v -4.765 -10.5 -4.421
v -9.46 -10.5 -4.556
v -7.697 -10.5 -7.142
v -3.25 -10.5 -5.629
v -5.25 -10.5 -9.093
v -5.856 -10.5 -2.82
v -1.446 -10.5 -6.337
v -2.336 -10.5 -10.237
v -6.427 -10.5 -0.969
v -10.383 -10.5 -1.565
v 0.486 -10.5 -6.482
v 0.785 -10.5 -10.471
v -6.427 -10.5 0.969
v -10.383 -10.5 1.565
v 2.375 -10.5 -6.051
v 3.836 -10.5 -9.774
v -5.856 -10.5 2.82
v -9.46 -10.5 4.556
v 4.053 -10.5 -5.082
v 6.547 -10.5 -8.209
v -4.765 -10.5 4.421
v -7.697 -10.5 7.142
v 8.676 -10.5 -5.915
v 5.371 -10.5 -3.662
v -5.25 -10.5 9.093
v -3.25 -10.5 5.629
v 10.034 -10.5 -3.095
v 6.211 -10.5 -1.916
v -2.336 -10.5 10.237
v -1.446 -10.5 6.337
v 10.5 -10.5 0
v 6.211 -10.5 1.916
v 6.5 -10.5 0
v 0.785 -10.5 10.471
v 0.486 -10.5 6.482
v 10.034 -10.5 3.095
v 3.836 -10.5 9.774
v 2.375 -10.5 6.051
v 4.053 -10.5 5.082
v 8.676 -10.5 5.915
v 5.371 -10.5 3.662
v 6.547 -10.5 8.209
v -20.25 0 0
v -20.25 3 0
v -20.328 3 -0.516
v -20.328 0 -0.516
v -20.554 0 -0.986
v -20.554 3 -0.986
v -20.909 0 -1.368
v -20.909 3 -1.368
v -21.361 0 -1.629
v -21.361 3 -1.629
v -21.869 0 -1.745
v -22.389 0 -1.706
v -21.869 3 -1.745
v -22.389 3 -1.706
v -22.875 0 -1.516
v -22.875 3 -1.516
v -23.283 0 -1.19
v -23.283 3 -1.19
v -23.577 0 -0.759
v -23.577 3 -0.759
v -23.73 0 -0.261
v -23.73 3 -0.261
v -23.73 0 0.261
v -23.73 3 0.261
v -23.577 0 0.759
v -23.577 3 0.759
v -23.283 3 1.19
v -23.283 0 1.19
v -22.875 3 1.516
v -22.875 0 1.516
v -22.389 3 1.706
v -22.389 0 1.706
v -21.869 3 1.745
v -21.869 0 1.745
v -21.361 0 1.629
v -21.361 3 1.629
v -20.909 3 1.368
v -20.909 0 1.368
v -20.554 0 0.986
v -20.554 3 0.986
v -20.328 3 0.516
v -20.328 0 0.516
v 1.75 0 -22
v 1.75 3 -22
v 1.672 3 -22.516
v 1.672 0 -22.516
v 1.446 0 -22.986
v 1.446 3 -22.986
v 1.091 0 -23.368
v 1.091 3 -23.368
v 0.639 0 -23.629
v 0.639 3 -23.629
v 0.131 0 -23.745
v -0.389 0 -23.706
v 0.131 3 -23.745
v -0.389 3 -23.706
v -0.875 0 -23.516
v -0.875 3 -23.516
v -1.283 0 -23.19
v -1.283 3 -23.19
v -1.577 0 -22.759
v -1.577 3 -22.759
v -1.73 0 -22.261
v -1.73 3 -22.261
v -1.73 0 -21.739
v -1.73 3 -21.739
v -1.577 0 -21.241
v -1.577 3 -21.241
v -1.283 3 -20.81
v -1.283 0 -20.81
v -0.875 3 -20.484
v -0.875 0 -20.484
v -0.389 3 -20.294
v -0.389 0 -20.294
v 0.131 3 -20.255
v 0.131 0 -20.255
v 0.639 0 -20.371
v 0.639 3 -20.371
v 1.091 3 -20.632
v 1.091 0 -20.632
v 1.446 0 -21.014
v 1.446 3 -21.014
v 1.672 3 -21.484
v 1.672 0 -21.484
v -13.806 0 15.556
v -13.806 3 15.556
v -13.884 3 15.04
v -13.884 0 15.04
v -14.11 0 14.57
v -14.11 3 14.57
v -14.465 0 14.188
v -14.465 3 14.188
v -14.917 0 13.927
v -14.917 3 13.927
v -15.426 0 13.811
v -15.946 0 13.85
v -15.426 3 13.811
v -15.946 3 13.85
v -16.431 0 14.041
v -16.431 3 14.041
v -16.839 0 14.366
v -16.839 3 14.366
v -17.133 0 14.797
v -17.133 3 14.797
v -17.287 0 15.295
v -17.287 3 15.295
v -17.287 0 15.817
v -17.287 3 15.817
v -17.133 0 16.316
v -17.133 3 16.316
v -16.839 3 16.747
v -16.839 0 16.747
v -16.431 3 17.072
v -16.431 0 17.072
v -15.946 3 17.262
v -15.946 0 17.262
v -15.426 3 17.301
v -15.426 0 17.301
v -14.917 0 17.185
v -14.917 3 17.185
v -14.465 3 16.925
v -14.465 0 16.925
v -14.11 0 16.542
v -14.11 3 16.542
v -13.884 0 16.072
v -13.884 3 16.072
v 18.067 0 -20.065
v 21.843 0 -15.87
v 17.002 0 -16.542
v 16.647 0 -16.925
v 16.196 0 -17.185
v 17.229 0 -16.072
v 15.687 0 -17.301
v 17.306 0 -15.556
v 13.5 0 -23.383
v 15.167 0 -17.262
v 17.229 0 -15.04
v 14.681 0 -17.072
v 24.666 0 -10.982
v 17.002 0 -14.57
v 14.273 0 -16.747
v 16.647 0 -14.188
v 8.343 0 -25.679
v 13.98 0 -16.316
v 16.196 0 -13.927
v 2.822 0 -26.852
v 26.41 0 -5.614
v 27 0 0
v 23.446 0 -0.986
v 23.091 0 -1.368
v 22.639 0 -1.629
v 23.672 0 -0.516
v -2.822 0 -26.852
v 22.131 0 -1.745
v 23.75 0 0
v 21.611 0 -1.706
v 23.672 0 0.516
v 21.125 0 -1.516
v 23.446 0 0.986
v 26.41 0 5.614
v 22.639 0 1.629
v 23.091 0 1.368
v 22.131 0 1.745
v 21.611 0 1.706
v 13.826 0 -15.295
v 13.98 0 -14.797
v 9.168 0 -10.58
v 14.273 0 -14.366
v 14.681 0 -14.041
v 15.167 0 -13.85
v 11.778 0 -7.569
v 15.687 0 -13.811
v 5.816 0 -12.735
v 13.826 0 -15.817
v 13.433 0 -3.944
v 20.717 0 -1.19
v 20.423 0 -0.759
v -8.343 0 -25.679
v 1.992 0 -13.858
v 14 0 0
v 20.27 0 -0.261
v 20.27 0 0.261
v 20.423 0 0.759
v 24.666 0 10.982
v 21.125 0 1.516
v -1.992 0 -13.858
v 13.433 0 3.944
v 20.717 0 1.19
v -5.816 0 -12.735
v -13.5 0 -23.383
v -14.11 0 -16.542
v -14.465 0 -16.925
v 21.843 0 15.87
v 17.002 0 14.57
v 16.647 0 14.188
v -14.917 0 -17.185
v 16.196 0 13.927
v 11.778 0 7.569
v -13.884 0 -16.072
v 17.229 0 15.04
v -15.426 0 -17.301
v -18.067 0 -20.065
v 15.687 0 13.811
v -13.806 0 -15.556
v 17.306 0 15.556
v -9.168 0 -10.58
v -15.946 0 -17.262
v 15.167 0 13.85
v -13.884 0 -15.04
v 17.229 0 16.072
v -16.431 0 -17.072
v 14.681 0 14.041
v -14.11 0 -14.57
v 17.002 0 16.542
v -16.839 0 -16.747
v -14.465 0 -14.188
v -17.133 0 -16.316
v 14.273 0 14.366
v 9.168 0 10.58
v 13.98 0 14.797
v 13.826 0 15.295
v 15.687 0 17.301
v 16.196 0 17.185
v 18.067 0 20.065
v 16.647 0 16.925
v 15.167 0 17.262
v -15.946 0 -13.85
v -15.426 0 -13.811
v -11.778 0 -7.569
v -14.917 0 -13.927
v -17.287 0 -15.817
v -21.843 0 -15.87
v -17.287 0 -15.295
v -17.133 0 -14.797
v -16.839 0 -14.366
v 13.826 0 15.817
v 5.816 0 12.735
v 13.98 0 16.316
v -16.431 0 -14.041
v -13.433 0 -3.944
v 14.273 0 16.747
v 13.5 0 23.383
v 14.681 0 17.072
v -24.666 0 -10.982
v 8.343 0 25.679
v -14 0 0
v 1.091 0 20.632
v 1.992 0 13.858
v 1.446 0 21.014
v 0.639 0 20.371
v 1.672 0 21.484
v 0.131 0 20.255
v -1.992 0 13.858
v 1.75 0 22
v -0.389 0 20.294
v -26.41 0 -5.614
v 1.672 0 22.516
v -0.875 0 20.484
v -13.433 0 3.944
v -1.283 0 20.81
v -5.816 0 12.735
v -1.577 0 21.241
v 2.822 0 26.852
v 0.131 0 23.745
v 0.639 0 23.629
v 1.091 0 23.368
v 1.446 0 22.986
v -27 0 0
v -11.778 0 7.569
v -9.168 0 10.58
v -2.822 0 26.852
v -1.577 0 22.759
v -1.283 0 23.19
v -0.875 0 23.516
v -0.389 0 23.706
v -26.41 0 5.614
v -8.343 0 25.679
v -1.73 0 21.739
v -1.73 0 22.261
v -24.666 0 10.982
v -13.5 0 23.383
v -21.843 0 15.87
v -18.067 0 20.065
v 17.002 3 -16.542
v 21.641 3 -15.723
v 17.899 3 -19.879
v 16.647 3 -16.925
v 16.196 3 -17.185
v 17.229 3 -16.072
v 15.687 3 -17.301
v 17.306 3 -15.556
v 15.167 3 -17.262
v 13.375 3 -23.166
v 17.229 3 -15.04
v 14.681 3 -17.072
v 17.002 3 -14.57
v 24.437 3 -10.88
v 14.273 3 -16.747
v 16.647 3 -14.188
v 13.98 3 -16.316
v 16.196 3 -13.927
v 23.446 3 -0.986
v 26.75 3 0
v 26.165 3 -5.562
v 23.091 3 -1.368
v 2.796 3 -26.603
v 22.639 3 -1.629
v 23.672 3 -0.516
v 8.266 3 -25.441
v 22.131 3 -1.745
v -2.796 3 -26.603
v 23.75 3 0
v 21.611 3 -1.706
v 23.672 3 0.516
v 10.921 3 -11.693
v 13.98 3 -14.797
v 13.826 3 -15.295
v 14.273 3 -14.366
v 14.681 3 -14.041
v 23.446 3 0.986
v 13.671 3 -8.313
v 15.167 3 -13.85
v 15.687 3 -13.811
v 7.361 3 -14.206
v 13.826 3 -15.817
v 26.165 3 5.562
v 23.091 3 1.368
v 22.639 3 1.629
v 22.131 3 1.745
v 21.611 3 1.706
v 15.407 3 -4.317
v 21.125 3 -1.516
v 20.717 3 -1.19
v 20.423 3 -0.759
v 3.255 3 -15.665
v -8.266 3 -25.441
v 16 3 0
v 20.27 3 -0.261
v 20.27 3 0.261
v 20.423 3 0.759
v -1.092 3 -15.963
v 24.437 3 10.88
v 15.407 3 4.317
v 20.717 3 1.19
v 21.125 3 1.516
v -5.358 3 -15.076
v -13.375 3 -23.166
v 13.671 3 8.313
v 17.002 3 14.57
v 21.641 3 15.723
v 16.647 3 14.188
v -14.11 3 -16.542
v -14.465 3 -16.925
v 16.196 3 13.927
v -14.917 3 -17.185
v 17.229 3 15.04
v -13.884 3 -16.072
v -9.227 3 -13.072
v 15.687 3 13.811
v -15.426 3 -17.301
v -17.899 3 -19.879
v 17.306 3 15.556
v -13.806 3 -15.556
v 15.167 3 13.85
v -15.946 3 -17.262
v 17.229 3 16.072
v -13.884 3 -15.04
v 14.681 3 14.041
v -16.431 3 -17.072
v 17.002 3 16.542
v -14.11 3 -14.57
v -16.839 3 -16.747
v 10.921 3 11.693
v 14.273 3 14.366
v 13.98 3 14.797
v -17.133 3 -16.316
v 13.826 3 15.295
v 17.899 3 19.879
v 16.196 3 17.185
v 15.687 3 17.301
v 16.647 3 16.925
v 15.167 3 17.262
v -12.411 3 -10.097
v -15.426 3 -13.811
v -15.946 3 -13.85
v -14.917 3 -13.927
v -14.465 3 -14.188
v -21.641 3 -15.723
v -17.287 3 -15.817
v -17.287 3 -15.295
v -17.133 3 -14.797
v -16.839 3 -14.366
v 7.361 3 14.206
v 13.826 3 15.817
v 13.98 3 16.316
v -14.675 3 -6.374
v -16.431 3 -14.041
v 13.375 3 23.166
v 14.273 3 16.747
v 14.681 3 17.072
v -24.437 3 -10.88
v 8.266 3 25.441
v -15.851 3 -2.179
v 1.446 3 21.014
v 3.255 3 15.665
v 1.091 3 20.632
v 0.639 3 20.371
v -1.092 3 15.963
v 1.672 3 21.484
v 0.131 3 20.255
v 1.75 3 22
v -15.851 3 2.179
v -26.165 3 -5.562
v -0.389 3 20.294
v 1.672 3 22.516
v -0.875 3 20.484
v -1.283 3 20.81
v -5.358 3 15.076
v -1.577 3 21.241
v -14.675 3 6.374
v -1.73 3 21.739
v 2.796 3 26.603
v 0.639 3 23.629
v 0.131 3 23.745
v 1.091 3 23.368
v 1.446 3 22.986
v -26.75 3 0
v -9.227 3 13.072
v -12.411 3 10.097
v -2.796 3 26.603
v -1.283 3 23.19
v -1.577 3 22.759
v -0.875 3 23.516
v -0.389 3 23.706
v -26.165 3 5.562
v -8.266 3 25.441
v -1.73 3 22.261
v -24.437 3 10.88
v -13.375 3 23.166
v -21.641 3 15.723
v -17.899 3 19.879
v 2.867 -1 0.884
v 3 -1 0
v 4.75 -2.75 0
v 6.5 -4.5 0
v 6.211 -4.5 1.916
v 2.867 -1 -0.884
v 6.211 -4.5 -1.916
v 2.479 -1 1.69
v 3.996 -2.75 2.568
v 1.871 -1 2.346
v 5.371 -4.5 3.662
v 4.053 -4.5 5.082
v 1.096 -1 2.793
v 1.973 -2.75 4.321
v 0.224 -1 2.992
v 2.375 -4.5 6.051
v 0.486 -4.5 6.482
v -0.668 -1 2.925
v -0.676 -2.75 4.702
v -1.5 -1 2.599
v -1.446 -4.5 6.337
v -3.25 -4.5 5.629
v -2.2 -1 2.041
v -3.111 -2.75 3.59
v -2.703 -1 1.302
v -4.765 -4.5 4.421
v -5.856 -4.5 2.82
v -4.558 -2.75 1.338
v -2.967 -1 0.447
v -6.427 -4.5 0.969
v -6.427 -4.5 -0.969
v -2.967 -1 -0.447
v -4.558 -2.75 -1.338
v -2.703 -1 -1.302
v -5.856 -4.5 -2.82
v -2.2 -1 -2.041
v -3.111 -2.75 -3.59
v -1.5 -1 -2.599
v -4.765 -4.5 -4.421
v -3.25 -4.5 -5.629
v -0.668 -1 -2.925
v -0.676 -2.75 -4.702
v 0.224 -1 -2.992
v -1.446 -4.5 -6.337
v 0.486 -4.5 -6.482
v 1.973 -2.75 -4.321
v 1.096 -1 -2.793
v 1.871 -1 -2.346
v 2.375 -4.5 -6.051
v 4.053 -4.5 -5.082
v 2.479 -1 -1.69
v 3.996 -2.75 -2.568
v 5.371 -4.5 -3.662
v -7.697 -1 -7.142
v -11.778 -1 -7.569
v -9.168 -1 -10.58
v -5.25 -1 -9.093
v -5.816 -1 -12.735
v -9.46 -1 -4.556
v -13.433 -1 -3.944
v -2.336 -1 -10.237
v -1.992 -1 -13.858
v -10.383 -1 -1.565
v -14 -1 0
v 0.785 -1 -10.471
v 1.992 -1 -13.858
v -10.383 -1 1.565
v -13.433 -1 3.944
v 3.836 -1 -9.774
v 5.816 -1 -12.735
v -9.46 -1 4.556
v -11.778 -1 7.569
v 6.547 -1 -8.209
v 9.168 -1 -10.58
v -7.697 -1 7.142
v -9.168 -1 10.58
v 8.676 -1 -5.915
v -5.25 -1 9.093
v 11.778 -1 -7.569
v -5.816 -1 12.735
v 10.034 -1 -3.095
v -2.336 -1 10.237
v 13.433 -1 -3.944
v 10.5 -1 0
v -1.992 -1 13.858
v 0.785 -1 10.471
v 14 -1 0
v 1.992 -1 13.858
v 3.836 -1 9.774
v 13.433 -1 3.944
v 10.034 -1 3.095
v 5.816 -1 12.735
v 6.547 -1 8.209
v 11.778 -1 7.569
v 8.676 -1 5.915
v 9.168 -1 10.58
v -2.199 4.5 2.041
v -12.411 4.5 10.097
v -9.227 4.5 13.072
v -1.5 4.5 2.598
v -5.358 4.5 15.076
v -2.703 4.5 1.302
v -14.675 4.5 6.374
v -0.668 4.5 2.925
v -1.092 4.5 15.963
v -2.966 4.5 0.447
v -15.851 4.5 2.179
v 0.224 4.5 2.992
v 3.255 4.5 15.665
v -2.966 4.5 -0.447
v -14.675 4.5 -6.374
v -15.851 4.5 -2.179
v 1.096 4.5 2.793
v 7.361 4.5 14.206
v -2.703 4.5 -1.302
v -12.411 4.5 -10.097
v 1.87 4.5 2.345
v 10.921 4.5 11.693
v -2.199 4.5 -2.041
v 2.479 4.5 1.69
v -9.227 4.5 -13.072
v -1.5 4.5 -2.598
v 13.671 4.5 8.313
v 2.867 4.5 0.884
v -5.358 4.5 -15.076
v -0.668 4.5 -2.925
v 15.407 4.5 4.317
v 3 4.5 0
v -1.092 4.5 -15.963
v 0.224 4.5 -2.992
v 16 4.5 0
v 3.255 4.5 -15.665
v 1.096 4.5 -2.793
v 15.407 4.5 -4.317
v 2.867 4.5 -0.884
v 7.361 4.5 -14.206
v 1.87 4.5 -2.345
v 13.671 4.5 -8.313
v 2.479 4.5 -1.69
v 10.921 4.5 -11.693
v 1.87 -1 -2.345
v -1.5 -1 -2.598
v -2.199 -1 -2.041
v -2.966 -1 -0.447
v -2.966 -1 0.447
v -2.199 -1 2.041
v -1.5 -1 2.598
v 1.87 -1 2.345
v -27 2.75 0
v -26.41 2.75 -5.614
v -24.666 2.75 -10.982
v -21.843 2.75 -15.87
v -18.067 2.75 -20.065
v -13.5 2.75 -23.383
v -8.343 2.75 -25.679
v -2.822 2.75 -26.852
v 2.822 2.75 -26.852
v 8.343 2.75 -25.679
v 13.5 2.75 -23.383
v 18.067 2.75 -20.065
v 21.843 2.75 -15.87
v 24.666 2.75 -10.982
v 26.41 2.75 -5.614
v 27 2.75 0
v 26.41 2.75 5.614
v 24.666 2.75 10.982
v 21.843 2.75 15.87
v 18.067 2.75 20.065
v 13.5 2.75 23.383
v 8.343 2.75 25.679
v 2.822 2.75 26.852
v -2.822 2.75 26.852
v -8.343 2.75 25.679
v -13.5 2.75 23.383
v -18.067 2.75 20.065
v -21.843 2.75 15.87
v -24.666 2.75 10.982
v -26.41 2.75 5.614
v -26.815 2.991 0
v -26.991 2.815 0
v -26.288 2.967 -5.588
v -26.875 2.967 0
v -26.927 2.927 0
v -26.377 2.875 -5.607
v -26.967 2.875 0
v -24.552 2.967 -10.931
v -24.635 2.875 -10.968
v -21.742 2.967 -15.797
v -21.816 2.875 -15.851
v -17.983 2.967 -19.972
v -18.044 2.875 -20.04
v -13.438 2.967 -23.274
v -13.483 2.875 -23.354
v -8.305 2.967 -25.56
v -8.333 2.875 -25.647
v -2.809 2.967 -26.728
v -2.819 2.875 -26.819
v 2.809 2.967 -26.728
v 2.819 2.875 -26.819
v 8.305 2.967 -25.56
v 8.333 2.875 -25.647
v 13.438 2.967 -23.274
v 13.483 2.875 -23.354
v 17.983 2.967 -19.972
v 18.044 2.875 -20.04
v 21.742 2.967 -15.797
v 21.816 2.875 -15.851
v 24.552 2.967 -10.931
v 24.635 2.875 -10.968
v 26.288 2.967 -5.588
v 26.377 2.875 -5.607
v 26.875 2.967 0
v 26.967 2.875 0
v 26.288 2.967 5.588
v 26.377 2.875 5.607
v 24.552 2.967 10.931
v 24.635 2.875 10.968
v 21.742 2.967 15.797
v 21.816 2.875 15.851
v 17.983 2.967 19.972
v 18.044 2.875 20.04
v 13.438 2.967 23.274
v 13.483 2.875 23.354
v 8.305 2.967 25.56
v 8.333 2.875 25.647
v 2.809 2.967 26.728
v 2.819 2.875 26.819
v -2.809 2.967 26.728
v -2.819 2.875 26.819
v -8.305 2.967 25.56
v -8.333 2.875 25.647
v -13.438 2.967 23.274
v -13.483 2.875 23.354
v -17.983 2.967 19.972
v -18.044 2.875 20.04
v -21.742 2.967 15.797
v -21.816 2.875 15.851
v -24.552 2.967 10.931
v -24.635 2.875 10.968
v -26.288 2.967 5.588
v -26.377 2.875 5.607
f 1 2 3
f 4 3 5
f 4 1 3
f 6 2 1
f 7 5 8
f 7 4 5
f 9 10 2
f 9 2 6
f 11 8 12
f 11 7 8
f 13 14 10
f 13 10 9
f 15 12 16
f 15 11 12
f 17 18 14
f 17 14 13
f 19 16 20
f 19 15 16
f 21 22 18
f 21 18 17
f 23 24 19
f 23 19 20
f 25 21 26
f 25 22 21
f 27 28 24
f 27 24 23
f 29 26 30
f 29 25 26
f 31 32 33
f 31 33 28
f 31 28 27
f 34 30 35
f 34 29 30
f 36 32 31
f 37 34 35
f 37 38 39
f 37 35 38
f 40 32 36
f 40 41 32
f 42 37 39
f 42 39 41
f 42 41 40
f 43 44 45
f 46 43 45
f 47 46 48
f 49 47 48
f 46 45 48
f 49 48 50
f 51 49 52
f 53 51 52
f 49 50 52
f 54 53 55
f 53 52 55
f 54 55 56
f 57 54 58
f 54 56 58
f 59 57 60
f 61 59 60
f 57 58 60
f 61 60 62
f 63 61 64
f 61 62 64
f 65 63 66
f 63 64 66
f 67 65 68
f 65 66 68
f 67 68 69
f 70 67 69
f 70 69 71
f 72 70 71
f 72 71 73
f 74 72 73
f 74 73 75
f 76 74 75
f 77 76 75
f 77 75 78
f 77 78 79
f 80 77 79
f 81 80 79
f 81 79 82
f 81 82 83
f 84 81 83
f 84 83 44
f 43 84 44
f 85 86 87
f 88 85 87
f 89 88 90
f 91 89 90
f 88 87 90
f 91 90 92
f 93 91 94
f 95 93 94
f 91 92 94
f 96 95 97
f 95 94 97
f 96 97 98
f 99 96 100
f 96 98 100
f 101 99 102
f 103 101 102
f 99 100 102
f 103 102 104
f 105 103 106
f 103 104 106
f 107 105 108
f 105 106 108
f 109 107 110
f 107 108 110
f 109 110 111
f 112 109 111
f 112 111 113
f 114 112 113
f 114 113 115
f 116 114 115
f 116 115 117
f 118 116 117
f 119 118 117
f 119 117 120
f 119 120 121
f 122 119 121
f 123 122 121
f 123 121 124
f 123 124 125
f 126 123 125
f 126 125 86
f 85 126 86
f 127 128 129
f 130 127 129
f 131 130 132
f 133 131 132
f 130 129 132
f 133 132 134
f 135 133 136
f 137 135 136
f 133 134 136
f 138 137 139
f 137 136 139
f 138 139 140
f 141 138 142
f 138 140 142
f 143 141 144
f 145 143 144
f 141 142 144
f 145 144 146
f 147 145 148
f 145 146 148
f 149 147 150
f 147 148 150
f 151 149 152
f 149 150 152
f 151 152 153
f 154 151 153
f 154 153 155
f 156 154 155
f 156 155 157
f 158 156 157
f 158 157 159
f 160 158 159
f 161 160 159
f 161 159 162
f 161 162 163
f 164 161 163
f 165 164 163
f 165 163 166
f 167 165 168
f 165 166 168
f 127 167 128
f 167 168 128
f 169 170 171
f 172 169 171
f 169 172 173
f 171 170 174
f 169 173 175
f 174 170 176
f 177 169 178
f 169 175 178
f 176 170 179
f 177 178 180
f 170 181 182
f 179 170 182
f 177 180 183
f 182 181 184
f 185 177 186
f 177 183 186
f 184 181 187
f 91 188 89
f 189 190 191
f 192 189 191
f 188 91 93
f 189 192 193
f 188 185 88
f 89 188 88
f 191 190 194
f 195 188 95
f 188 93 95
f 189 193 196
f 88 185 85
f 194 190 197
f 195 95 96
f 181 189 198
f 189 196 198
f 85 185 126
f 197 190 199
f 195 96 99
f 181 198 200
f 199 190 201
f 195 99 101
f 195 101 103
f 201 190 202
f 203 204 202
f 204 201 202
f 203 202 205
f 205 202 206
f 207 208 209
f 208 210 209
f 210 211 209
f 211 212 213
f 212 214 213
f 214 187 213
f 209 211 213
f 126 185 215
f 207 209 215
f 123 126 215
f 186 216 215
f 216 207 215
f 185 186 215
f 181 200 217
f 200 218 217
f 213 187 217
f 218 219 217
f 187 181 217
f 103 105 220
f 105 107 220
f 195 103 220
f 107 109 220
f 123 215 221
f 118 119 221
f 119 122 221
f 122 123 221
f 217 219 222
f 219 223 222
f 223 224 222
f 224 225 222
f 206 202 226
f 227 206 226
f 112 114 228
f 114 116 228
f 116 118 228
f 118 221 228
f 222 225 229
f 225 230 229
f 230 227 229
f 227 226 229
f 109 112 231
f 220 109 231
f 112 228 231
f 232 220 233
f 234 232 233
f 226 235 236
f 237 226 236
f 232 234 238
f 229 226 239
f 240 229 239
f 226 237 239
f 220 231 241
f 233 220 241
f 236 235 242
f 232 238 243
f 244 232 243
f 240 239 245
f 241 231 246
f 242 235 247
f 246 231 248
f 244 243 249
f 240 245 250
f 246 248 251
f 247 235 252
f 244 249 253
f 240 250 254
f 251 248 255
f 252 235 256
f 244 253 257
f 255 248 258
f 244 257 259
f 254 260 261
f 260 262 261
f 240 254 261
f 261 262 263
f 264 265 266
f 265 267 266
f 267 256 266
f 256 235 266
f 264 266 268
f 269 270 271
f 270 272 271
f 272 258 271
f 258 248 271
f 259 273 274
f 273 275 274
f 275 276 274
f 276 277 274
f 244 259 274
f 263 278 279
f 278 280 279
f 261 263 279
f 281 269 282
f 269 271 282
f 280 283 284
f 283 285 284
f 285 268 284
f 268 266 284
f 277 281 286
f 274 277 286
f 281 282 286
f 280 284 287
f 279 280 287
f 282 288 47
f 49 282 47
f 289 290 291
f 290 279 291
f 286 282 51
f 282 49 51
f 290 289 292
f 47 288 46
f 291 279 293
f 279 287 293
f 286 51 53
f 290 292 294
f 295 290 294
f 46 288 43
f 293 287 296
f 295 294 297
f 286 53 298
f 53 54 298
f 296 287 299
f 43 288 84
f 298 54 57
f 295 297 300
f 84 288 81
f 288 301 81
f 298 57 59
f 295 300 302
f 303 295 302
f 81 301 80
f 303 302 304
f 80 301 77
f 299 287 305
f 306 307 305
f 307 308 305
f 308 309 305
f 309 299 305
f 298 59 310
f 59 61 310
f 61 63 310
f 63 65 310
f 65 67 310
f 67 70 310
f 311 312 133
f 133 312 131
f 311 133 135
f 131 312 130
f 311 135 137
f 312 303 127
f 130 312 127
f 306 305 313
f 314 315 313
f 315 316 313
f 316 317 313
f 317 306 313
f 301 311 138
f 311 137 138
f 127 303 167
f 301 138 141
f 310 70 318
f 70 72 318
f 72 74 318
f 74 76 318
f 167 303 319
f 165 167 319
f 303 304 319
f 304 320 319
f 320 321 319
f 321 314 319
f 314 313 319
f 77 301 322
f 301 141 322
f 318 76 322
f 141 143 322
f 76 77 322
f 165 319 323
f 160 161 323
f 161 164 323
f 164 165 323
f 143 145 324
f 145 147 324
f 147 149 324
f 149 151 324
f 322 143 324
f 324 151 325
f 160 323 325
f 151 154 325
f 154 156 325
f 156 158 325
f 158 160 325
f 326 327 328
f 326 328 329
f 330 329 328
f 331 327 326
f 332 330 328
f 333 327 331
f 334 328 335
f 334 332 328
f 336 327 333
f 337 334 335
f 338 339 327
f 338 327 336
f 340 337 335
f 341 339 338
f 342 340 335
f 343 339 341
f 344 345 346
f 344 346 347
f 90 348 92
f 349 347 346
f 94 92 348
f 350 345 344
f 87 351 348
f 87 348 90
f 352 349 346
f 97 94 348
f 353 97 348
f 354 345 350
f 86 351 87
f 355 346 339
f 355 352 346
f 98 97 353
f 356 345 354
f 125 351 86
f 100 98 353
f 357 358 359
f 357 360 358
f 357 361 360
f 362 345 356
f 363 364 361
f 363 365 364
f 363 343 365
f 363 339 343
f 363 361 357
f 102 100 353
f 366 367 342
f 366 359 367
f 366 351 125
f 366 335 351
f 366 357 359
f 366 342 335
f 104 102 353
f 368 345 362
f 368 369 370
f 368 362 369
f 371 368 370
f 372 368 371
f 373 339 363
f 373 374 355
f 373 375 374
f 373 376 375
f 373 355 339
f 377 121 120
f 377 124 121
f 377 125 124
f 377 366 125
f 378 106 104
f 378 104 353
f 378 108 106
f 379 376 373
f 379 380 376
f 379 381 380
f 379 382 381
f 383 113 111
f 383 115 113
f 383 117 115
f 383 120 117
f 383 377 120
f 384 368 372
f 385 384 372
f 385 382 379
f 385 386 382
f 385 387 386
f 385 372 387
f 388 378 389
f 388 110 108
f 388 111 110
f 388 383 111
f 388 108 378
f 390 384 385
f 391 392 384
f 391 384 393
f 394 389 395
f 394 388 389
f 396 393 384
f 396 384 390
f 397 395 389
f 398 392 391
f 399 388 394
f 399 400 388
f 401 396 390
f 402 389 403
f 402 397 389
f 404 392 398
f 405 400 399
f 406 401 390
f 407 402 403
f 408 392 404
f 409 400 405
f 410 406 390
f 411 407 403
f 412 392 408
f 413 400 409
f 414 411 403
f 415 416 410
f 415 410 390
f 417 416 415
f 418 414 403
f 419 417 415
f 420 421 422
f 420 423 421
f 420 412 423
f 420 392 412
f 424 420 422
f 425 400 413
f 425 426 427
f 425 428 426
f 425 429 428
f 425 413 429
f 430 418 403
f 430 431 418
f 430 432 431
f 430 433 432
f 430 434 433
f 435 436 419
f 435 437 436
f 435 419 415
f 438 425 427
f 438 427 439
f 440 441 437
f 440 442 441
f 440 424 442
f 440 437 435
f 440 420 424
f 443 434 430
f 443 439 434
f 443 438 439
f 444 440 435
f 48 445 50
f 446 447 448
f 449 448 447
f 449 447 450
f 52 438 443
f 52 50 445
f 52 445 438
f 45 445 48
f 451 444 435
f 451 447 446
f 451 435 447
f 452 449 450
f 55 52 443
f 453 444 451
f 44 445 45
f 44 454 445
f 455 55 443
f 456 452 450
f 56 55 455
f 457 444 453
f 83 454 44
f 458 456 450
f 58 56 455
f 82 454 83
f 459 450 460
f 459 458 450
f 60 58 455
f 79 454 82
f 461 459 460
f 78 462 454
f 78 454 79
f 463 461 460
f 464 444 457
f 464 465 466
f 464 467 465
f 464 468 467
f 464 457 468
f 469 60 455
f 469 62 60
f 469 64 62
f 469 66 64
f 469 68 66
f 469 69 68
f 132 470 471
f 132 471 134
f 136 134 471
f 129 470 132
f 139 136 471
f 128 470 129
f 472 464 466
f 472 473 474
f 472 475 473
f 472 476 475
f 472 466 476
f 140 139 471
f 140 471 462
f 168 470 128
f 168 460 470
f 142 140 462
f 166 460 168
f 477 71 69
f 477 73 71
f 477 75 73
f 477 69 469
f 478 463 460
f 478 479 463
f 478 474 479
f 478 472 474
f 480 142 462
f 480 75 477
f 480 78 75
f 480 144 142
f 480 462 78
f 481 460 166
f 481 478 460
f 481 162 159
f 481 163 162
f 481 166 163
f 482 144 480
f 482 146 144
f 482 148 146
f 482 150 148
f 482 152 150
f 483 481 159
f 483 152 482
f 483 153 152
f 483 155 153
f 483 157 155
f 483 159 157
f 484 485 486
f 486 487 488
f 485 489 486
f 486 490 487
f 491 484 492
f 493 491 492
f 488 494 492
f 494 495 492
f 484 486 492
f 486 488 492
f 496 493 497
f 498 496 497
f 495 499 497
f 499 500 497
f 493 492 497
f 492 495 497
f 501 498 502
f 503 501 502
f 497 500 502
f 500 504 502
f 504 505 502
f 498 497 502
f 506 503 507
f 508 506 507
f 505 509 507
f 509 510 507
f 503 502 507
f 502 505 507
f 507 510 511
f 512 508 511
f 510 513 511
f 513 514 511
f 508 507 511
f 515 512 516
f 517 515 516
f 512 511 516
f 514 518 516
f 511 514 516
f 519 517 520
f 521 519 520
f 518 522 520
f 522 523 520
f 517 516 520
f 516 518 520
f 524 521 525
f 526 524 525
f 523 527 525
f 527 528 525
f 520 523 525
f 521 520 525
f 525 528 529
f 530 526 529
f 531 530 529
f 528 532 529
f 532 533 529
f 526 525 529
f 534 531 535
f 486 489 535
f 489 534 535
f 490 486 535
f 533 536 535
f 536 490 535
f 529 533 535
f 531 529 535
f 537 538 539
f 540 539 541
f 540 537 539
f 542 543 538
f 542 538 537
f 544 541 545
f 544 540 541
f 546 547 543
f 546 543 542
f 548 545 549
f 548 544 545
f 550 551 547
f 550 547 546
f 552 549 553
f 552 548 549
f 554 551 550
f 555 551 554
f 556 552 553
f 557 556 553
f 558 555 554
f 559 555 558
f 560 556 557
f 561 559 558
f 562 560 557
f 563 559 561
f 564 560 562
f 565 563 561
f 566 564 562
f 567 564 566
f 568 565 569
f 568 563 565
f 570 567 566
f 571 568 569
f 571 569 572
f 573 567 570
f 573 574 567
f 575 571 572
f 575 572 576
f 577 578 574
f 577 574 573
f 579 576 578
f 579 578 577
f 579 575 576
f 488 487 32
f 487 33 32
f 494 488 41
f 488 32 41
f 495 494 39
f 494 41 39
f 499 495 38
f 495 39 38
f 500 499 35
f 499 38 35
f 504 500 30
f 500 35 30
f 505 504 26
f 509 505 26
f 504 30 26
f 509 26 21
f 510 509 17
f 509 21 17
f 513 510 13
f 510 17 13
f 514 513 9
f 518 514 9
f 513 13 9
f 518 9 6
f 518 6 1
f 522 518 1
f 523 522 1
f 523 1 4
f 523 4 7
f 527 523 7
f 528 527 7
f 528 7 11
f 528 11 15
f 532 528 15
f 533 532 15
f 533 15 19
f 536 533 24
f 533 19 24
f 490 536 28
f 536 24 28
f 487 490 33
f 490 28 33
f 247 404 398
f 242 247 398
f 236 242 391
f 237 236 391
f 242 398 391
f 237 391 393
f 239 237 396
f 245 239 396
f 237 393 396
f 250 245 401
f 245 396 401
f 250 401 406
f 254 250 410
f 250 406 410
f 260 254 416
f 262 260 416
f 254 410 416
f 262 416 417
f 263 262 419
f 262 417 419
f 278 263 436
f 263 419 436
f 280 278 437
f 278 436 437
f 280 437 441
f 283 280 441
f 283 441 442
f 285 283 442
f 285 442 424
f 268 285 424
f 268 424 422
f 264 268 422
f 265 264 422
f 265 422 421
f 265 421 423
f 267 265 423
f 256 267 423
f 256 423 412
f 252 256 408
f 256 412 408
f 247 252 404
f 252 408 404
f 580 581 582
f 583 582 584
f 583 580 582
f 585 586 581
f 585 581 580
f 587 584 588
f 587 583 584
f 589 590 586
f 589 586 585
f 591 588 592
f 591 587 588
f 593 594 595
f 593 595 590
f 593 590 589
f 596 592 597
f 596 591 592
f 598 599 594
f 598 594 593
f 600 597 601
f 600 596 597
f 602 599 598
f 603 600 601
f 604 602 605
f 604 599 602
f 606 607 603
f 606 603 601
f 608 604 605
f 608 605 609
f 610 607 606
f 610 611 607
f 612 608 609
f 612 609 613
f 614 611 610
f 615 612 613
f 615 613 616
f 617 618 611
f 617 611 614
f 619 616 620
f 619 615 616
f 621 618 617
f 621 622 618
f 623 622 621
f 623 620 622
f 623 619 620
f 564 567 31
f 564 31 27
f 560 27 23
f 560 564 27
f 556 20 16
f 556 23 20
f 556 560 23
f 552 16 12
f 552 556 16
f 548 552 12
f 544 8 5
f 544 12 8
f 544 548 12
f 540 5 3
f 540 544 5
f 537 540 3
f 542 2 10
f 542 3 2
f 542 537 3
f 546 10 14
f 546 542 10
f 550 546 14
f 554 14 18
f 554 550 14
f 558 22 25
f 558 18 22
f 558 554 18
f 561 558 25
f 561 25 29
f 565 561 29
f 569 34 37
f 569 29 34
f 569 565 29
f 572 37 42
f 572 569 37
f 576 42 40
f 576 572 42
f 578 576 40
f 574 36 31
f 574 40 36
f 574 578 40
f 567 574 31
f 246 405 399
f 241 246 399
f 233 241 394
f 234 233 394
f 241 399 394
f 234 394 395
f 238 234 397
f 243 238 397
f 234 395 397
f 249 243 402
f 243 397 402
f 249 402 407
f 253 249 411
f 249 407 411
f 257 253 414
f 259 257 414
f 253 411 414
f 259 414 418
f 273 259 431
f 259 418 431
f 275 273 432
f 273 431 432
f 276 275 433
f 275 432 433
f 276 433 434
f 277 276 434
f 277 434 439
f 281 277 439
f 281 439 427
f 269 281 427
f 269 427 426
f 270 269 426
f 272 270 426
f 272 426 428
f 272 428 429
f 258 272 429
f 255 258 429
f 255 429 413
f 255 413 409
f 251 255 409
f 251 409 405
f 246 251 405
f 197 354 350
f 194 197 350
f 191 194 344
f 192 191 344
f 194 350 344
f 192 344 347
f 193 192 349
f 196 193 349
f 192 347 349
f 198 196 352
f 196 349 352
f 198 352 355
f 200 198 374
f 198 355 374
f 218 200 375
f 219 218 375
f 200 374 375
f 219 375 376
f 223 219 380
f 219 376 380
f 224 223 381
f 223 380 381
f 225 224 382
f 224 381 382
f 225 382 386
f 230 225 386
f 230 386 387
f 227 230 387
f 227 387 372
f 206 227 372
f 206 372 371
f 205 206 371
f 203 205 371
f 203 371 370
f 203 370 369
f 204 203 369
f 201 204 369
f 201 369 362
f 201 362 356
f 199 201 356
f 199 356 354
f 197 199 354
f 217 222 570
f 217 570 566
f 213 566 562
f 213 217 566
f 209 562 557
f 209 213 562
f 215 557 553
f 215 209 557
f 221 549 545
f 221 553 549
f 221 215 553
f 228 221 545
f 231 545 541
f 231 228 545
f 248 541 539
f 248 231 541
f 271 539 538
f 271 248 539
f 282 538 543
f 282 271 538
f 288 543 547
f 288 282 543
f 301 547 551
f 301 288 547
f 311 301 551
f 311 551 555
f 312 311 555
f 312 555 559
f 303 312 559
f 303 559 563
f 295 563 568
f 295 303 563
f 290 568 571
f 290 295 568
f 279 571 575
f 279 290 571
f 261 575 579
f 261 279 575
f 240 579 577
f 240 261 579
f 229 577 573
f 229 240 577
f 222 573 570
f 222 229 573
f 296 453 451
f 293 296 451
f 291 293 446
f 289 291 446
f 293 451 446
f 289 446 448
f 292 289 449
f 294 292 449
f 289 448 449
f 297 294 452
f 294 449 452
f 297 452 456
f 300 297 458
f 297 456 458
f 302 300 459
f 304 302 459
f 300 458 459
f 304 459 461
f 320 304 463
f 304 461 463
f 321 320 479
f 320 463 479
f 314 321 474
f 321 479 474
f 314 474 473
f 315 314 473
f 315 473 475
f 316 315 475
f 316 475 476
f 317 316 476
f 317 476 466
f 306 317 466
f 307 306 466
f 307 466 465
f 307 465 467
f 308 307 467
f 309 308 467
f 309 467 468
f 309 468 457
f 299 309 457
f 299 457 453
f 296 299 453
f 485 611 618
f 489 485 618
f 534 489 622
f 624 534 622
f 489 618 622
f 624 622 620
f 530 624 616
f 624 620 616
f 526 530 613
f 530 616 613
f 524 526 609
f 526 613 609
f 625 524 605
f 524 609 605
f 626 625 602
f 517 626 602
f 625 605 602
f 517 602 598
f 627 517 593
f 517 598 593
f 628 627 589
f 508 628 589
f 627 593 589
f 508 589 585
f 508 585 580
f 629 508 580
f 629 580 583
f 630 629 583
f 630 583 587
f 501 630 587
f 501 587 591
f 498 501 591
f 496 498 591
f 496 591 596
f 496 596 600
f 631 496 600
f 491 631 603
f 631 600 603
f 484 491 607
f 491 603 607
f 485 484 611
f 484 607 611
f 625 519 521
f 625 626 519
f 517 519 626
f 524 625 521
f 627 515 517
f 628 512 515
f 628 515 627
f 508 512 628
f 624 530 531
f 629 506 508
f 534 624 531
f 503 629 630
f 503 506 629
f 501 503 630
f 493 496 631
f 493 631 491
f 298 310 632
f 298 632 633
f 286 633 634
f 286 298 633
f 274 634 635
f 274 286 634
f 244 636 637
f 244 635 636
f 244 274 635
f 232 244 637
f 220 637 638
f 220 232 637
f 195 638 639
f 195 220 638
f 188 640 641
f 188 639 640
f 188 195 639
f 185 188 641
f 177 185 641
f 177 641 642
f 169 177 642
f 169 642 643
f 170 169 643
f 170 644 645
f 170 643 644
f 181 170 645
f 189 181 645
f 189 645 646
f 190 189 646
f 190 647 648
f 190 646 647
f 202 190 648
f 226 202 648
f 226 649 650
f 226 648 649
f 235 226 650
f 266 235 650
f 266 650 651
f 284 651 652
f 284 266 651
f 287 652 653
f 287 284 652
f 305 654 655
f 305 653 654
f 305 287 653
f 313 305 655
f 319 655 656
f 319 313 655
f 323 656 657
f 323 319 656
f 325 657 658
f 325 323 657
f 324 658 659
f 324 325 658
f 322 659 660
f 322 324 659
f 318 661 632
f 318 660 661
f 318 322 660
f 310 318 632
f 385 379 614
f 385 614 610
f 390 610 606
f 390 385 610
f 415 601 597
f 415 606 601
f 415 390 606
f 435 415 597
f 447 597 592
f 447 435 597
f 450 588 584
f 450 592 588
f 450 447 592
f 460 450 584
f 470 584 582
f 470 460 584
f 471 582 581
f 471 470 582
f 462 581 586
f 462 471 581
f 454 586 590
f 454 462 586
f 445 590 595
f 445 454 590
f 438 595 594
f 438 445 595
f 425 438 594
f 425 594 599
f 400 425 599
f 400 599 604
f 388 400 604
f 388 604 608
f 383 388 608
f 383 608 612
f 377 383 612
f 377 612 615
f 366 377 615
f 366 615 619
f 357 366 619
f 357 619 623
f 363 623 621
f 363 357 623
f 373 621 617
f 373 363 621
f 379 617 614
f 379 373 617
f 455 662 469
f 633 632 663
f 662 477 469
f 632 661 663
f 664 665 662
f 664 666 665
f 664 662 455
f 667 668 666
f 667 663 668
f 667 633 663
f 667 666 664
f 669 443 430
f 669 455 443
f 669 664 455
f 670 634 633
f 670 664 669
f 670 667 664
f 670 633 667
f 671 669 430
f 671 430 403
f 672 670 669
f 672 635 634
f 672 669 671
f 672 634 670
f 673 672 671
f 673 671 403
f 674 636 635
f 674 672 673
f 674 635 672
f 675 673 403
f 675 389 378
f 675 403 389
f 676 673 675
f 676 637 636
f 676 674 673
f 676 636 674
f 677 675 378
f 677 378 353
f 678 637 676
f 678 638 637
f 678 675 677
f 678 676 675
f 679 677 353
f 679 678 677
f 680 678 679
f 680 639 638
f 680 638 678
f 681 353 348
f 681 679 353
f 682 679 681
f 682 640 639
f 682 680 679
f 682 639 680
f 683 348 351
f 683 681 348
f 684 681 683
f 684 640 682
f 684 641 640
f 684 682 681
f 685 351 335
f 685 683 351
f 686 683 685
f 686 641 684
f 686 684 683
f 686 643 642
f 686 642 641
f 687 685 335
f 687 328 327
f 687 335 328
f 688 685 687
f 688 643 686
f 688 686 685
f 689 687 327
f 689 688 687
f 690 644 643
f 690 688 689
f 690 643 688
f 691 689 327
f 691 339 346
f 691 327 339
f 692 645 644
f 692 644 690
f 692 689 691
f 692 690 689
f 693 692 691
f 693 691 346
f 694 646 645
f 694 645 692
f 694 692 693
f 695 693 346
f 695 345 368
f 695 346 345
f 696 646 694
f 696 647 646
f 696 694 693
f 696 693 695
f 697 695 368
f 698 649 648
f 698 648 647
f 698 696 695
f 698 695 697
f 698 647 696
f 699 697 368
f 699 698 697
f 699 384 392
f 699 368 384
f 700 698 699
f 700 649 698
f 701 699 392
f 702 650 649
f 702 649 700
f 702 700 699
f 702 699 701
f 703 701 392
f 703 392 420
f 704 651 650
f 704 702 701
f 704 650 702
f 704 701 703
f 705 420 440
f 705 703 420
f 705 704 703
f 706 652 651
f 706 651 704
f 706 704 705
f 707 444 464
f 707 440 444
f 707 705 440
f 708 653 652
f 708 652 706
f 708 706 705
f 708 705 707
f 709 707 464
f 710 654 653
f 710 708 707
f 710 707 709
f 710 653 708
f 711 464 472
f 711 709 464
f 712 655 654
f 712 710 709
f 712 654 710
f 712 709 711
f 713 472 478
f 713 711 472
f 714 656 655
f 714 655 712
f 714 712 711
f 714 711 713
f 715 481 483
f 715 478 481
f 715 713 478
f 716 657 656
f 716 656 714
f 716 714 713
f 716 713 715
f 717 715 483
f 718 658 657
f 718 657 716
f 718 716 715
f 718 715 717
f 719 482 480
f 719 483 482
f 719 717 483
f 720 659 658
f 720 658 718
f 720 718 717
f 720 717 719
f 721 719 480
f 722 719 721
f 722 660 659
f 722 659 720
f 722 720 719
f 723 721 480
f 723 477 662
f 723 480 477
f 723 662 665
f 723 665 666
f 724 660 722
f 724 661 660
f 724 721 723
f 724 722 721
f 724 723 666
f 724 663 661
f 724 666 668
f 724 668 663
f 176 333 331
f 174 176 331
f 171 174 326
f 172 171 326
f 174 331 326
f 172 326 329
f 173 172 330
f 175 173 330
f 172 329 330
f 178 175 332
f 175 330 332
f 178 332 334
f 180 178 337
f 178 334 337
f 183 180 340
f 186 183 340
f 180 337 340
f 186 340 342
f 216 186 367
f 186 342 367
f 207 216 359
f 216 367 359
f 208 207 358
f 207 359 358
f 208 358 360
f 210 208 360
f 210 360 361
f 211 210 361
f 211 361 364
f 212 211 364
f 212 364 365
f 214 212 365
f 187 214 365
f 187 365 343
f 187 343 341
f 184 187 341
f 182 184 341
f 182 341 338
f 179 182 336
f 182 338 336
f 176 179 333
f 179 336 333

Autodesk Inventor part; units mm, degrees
ref_plane "YZ Plane" through (0, 0, 0) normal (1, 0, 0) x (0, 1, 0)
ref_plane "XZ Plane" through (0, 0, 0) normal (0, 1, 0) x (-1, 0, 0)
ref_plane "XY Plane" through (0, 0, 0) normal (0, 0, 1) x (1, 0, 0)
sketch "Sketch1" plane through (0, 0, 0) normal (0, 1, 0) x (-1, 0, 0)
  circle A0 centre (0, 0) radius 27
  dimension "d0" = 54
extrude "Extrusion1" add sketch "Sketch1" along normal blind 3
sketch "Sketch2" plane through (0, 3, 0) normal (0, 1, 0) x (1, 0, 0)
  circle A0 centre (0, 0) radius 16
  dimension "d4" = 32
extrude "Extrusion2" add sketch "Sketch2" along normal blind 1.5
sketch "Sketch3" plane through (0, 0, 0) normal (0, -1, 0) x (1, 0, 0)
  circle A0 centre (0, 0) radius 14
  dimension "d7" = 28
extrude "Extrusion3" add sketch "Sketch3" along normal blind 1
sketch "Sketch4" plane through (0, -1, 0) normal (0, -1, 0) x (1, 0, 0)
  circle A0 centre (0, 0) radius 10.5
  dimension "d10" = 21
extrude "Extrusion4" add sketch "Sketch4" along normal blind 9.5
sketch "Sketch6" plane through (0, 4.5, 0) normal (0, 1, 0) x (1, 0, 0)
  circle A0 centre (0, 0) radius 3
  dimension "d14" = 6
extrude "Extrusion5" cut sketch "Sketch6" against normal through all
sketch "Sketch7" plane through (0, 3, 0) normal (0, 1, 0) x (1, 0, 0)
  circle A0 centre (0, 0) radius 22 construction
  circle A1 centre (0, 22) radius 1.75
  circle A2 centre (-15.5563, 15.5563) radius 1.75
  circle A3 centre (-22, 0) radius 1.75
  circle A4 centre (-15.5563, -15.5563) radius 1.75
  circle A5 centre (0, -22) radius 1.75
  circle A6 centre (15.5563, -15.5563) radius 1.75
  circle A7 centre (22, 0) radius 1.75
  circle A8 centre (15.5563, 15.5563) radius 1.75
  dimension "d17" = 44
  dimension "d18" = 3.5
  dimension "d21" = 360
  dimension "d23" = 6.4436
extrude "Extrusion6" cut sketch "Sketch7" against normal blind 3
sketch "Sketch9" plane through (0, -10.5, 0) normal (0, -1, 0) x (1, 0, 0)
  circle A0 centre (0, 0) radius 6.5
  dimension "d26" = 13
extrude "Extrusion7" cut sketch "Sketch9" against normal blind 9.5
chamfer "Chamfer1" distance 3.5 angle 45 1 edges at (-6.5, -1, 0)
fillet "Fillet1" radius 0.25 1 edges at (27, 3, 0)
properties part number "Lower Cylinder Cover" material "Brass, Soft Yellow"
